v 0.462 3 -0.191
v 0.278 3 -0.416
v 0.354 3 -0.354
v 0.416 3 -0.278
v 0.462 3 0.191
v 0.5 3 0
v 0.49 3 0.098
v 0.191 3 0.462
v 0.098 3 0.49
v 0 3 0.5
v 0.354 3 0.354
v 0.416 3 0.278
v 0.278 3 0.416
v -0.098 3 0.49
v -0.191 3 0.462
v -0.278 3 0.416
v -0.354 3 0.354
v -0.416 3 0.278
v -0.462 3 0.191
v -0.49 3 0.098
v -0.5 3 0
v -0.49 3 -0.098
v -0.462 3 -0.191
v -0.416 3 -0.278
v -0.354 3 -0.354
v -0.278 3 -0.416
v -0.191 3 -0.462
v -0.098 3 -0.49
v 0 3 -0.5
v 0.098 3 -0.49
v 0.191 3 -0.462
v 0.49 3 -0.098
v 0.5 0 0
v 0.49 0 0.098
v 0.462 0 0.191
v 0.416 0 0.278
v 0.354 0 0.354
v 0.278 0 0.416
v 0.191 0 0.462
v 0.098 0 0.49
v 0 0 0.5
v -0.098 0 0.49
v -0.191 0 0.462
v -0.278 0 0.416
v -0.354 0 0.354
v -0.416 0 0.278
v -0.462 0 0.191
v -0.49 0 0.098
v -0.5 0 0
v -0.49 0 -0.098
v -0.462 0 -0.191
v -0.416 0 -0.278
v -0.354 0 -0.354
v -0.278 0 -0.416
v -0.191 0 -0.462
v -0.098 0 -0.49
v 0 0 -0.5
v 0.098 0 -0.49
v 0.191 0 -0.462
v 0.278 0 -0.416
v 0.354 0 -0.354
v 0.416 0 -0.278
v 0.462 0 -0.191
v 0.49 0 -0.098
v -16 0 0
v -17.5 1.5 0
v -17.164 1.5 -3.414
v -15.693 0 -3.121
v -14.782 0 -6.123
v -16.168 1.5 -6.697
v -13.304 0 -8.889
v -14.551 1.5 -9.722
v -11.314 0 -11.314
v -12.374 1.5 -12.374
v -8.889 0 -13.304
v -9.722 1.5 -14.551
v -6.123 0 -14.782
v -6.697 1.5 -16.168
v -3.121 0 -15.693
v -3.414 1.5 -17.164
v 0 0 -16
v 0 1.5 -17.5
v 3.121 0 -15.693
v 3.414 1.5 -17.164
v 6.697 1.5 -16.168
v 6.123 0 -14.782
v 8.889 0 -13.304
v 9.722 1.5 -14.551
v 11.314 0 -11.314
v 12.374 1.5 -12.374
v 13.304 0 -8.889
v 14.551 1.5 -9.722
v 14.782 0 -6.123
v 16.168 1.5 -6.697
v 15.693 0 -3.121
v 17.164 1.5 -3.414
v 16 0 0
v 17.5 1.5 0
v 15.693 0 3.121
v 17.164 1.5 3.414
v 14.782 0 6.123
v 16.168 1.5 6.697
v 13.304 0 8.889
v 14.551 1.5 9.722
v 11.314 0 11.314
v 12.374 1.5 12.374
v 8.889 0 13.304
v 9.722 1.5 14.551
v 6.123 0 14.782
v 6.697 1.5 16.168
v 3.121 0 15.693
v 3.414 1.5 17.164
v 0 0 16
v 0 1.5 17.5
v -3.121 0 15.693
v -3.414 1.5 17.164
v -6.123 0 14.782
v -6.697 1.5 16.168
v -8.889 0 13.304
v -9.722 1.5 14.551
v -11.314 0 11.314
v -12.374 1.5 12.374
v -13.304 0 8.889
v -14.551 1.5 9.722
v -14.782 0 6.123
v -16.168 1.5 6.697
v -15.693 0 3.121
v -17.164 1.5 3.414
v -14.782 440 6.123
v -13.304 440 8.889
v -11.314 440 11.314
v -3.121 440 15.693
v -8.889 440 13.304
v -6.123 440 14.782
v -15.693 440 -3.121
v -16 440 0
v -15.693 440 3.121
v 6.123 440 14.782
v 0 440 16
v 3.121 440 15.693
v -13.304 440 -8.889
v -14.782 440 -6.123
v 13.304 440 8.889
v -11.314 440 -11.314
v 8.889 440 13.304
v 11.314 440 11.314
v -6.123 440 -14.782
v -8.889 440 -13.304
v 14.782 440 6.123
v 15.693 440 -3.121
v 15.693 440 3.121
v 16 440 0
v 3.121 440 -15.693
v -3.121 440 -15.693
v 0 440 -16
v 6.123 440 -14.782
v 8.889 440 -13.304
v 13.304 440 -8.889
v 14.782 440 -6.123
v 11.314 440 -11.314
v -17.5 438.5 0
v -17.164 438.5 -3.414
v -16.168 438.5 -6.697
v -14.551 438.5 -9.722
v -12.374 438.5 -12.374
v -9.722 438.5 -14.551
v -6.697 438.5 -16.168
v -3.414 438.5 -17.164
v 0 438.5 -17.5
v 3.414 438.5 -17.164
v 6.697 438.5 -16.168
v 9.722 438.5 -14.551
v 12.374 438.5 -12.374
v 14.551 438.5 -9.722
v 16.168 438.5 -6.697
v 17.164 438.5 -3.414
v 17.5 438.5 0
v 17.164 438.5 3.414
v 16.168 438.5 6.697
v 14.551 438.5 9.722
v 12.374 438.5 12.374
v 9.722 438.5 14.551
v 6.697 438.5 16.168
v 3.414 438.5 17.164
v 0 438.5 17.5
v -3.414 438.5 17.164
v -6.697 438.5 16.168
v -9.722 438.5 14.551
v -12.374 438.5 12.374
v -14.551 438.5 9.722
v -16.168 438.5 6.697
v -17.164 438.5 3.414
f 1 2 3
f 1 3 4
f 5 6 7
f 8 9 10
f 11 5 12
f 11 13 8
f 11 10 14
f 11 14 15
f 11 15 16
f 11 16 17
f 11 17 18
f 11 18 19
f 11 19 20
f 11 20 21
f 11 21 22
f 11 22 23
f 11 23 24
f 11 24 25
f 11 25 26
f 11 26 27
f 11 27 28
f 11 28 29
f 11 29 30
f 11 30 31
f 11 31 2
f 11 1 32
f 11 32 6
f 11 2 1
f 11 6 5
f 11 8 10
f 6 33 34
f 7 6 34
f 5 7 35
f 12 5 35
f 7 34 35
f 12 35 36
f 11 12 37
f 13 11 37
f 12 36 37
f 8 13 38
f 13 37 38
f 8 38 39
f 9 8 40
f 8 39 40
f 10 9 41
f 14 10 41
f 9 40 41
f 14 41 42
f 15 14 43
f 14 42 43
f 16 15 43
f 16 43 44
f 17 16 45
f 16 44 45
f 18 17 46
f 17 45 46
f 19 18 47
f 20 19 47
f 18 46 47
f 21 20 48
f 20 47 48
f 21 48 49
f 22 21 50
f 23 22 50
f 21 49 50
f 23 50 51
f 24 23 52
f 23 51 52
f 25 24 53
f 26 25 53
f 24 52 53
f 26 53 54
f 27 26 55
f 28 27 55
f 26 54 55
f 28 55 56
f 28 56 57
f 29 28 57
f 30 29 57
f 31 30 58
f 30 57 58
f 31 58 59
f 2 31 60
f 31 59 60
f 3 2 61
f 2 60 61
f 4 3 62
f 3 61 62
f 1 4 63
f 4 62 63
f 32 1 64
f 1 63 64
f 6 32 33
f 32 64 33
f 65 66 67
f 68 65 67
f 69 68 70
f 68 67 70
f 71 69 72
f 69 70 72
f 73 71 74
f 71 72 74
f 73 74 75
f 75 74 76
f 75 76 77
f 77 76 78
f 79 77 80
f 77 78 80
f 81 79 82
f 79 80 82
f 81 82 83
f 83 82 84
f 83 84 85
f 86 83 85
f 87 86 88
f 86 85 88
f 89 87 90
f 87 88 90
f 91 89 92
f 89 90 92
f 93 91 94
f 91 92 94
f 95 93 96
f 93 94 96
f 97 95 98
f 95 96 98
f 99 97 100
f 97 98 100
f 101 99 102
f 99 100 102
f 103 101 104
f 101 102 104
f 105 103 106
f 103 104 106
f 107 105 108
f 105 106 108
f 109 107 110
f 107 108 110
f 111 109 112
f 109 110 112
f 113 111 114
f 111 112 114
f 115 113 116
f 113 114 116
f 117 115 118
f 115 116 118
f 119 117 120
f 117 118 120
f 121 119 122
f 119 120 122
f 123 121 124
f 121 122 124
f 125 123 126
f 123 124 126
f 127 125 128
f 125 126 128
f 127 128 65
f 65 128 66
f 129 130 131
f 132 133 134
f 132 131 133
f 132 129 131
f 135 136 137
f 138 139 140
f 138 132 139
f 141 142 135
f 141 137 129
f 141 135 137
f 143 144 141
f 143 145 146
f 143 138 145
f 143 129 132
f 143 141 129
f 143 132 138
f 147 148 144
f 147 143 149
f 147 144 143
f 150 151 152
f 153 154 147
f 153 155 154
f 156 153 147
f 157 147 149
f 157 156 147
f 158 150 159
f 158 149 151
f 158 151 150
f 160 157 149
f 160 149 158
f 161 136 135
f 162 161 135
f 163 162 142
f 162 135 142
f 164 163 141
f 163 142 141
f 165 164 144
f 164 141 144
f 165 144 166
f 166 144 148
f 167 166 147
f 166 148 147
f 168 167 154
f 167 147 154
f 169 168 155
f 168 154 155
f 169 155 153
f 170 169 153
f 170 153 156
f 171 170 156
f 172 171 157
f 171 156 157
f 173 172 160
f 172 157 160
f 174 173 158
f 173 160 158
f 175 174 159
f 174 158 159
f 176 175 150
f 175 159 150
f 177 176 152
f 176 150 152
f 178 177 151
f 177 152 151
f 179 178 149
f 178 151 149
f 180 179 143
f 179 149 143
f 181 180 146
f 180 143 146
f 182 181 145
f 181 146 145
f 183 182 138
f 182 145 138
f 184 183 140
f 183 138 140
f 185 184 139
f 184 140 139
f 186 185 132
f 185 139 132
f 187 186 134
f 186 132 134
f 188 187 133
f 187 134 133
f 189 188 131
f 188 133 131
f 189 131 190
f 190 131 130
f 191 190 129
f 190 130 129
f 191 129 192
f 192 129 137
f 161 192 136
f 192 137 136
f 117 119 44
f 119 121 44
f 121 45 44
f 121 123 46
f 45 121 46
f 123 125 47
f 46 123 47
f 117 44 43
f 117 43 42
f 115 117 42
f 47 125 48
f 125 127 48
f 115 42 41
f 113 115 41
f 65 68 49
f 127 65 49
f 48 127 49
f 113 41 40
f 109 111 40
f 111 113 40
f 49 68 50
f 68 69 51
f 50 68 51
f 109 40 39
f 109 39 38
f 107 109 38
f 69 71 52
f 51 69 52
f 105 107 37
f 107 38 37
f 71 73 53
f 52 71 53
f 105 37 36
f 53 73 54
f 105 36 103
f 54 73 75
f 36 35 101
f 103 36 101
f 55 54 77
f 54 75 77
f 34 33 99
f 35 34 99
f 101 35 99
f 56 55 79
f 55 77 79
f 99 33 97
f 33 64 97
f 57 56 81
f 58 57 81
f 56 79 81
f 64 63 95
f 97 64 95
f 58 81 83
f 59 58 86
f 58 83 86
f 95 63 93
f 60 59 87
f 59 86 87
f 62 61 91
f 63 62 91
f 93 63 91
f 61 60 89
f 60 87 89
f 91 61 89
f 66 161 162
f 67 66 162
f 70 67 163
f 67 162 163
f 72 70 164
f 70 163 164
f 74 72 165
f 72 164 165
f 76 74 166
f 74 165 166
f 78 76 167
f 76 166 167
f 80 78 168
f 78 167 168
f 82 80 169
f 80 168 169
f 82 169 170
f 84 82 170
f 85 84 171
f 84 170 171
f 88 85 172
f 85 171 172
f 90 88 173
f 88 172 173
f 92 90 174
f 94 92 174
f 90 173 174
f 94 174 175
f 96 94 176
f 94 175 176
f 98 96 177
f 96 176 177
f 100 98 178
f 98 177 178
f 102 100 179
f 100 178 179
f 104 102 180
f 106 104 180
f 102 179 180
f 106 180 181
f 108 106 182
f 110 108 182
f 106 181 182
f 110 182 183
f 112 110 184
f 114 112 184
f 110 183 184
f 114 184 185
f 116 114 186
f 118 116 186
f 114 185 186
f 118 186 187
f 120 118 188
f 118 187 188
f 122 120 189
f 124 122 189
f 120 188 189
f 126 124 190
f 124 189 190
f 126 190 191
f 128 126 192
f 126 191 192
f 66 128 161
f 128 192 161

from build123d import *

# Parameters (mm, degrees)
SKETCH2_W          = 17.5
SKETCH2_H          = 440
CHAMFER1_SIZE      = 1.5
SKETCH3_R          = 0.5
CUT_EXTRUDE1_DEPTH = 3


with BuildPart() as part:
    # Sketch2 → Revolve1 (revolve)
    with BuildSketch(Plane.XY, mode=Mode.PRIVATE) as revolve1_sk:
        with Locations((8.75, 220)):
            Rectangle(SKETCH2_W, SKETCH2_H)
    revolve(revolve1_sk.sketch.rotate(Axis((0, 440, 0), (0, -1, 0)), 180), axis=Axis((0, 440, 0), (0, -1, 0)))

    # Chamfer1
    chamfer1_edges = [part.edges().sort_by_distance(p)[0] for p in [
        (17.5, 0, 0),
        (17.5, 440, 0),
    ]]
    chamfer(chamfer1_edges, length=CHAMFER1_SIZE)

    # Sketch3 → Cut-Extrude1 (cut)
    with BuildSketch(Plane.XZ):
        Circle(SKETCH3_R)
    extrude(amount=-CUT_EXTRUDE1_DEPTH, mode=Mode.SUBTRACT)


solid = part.part
